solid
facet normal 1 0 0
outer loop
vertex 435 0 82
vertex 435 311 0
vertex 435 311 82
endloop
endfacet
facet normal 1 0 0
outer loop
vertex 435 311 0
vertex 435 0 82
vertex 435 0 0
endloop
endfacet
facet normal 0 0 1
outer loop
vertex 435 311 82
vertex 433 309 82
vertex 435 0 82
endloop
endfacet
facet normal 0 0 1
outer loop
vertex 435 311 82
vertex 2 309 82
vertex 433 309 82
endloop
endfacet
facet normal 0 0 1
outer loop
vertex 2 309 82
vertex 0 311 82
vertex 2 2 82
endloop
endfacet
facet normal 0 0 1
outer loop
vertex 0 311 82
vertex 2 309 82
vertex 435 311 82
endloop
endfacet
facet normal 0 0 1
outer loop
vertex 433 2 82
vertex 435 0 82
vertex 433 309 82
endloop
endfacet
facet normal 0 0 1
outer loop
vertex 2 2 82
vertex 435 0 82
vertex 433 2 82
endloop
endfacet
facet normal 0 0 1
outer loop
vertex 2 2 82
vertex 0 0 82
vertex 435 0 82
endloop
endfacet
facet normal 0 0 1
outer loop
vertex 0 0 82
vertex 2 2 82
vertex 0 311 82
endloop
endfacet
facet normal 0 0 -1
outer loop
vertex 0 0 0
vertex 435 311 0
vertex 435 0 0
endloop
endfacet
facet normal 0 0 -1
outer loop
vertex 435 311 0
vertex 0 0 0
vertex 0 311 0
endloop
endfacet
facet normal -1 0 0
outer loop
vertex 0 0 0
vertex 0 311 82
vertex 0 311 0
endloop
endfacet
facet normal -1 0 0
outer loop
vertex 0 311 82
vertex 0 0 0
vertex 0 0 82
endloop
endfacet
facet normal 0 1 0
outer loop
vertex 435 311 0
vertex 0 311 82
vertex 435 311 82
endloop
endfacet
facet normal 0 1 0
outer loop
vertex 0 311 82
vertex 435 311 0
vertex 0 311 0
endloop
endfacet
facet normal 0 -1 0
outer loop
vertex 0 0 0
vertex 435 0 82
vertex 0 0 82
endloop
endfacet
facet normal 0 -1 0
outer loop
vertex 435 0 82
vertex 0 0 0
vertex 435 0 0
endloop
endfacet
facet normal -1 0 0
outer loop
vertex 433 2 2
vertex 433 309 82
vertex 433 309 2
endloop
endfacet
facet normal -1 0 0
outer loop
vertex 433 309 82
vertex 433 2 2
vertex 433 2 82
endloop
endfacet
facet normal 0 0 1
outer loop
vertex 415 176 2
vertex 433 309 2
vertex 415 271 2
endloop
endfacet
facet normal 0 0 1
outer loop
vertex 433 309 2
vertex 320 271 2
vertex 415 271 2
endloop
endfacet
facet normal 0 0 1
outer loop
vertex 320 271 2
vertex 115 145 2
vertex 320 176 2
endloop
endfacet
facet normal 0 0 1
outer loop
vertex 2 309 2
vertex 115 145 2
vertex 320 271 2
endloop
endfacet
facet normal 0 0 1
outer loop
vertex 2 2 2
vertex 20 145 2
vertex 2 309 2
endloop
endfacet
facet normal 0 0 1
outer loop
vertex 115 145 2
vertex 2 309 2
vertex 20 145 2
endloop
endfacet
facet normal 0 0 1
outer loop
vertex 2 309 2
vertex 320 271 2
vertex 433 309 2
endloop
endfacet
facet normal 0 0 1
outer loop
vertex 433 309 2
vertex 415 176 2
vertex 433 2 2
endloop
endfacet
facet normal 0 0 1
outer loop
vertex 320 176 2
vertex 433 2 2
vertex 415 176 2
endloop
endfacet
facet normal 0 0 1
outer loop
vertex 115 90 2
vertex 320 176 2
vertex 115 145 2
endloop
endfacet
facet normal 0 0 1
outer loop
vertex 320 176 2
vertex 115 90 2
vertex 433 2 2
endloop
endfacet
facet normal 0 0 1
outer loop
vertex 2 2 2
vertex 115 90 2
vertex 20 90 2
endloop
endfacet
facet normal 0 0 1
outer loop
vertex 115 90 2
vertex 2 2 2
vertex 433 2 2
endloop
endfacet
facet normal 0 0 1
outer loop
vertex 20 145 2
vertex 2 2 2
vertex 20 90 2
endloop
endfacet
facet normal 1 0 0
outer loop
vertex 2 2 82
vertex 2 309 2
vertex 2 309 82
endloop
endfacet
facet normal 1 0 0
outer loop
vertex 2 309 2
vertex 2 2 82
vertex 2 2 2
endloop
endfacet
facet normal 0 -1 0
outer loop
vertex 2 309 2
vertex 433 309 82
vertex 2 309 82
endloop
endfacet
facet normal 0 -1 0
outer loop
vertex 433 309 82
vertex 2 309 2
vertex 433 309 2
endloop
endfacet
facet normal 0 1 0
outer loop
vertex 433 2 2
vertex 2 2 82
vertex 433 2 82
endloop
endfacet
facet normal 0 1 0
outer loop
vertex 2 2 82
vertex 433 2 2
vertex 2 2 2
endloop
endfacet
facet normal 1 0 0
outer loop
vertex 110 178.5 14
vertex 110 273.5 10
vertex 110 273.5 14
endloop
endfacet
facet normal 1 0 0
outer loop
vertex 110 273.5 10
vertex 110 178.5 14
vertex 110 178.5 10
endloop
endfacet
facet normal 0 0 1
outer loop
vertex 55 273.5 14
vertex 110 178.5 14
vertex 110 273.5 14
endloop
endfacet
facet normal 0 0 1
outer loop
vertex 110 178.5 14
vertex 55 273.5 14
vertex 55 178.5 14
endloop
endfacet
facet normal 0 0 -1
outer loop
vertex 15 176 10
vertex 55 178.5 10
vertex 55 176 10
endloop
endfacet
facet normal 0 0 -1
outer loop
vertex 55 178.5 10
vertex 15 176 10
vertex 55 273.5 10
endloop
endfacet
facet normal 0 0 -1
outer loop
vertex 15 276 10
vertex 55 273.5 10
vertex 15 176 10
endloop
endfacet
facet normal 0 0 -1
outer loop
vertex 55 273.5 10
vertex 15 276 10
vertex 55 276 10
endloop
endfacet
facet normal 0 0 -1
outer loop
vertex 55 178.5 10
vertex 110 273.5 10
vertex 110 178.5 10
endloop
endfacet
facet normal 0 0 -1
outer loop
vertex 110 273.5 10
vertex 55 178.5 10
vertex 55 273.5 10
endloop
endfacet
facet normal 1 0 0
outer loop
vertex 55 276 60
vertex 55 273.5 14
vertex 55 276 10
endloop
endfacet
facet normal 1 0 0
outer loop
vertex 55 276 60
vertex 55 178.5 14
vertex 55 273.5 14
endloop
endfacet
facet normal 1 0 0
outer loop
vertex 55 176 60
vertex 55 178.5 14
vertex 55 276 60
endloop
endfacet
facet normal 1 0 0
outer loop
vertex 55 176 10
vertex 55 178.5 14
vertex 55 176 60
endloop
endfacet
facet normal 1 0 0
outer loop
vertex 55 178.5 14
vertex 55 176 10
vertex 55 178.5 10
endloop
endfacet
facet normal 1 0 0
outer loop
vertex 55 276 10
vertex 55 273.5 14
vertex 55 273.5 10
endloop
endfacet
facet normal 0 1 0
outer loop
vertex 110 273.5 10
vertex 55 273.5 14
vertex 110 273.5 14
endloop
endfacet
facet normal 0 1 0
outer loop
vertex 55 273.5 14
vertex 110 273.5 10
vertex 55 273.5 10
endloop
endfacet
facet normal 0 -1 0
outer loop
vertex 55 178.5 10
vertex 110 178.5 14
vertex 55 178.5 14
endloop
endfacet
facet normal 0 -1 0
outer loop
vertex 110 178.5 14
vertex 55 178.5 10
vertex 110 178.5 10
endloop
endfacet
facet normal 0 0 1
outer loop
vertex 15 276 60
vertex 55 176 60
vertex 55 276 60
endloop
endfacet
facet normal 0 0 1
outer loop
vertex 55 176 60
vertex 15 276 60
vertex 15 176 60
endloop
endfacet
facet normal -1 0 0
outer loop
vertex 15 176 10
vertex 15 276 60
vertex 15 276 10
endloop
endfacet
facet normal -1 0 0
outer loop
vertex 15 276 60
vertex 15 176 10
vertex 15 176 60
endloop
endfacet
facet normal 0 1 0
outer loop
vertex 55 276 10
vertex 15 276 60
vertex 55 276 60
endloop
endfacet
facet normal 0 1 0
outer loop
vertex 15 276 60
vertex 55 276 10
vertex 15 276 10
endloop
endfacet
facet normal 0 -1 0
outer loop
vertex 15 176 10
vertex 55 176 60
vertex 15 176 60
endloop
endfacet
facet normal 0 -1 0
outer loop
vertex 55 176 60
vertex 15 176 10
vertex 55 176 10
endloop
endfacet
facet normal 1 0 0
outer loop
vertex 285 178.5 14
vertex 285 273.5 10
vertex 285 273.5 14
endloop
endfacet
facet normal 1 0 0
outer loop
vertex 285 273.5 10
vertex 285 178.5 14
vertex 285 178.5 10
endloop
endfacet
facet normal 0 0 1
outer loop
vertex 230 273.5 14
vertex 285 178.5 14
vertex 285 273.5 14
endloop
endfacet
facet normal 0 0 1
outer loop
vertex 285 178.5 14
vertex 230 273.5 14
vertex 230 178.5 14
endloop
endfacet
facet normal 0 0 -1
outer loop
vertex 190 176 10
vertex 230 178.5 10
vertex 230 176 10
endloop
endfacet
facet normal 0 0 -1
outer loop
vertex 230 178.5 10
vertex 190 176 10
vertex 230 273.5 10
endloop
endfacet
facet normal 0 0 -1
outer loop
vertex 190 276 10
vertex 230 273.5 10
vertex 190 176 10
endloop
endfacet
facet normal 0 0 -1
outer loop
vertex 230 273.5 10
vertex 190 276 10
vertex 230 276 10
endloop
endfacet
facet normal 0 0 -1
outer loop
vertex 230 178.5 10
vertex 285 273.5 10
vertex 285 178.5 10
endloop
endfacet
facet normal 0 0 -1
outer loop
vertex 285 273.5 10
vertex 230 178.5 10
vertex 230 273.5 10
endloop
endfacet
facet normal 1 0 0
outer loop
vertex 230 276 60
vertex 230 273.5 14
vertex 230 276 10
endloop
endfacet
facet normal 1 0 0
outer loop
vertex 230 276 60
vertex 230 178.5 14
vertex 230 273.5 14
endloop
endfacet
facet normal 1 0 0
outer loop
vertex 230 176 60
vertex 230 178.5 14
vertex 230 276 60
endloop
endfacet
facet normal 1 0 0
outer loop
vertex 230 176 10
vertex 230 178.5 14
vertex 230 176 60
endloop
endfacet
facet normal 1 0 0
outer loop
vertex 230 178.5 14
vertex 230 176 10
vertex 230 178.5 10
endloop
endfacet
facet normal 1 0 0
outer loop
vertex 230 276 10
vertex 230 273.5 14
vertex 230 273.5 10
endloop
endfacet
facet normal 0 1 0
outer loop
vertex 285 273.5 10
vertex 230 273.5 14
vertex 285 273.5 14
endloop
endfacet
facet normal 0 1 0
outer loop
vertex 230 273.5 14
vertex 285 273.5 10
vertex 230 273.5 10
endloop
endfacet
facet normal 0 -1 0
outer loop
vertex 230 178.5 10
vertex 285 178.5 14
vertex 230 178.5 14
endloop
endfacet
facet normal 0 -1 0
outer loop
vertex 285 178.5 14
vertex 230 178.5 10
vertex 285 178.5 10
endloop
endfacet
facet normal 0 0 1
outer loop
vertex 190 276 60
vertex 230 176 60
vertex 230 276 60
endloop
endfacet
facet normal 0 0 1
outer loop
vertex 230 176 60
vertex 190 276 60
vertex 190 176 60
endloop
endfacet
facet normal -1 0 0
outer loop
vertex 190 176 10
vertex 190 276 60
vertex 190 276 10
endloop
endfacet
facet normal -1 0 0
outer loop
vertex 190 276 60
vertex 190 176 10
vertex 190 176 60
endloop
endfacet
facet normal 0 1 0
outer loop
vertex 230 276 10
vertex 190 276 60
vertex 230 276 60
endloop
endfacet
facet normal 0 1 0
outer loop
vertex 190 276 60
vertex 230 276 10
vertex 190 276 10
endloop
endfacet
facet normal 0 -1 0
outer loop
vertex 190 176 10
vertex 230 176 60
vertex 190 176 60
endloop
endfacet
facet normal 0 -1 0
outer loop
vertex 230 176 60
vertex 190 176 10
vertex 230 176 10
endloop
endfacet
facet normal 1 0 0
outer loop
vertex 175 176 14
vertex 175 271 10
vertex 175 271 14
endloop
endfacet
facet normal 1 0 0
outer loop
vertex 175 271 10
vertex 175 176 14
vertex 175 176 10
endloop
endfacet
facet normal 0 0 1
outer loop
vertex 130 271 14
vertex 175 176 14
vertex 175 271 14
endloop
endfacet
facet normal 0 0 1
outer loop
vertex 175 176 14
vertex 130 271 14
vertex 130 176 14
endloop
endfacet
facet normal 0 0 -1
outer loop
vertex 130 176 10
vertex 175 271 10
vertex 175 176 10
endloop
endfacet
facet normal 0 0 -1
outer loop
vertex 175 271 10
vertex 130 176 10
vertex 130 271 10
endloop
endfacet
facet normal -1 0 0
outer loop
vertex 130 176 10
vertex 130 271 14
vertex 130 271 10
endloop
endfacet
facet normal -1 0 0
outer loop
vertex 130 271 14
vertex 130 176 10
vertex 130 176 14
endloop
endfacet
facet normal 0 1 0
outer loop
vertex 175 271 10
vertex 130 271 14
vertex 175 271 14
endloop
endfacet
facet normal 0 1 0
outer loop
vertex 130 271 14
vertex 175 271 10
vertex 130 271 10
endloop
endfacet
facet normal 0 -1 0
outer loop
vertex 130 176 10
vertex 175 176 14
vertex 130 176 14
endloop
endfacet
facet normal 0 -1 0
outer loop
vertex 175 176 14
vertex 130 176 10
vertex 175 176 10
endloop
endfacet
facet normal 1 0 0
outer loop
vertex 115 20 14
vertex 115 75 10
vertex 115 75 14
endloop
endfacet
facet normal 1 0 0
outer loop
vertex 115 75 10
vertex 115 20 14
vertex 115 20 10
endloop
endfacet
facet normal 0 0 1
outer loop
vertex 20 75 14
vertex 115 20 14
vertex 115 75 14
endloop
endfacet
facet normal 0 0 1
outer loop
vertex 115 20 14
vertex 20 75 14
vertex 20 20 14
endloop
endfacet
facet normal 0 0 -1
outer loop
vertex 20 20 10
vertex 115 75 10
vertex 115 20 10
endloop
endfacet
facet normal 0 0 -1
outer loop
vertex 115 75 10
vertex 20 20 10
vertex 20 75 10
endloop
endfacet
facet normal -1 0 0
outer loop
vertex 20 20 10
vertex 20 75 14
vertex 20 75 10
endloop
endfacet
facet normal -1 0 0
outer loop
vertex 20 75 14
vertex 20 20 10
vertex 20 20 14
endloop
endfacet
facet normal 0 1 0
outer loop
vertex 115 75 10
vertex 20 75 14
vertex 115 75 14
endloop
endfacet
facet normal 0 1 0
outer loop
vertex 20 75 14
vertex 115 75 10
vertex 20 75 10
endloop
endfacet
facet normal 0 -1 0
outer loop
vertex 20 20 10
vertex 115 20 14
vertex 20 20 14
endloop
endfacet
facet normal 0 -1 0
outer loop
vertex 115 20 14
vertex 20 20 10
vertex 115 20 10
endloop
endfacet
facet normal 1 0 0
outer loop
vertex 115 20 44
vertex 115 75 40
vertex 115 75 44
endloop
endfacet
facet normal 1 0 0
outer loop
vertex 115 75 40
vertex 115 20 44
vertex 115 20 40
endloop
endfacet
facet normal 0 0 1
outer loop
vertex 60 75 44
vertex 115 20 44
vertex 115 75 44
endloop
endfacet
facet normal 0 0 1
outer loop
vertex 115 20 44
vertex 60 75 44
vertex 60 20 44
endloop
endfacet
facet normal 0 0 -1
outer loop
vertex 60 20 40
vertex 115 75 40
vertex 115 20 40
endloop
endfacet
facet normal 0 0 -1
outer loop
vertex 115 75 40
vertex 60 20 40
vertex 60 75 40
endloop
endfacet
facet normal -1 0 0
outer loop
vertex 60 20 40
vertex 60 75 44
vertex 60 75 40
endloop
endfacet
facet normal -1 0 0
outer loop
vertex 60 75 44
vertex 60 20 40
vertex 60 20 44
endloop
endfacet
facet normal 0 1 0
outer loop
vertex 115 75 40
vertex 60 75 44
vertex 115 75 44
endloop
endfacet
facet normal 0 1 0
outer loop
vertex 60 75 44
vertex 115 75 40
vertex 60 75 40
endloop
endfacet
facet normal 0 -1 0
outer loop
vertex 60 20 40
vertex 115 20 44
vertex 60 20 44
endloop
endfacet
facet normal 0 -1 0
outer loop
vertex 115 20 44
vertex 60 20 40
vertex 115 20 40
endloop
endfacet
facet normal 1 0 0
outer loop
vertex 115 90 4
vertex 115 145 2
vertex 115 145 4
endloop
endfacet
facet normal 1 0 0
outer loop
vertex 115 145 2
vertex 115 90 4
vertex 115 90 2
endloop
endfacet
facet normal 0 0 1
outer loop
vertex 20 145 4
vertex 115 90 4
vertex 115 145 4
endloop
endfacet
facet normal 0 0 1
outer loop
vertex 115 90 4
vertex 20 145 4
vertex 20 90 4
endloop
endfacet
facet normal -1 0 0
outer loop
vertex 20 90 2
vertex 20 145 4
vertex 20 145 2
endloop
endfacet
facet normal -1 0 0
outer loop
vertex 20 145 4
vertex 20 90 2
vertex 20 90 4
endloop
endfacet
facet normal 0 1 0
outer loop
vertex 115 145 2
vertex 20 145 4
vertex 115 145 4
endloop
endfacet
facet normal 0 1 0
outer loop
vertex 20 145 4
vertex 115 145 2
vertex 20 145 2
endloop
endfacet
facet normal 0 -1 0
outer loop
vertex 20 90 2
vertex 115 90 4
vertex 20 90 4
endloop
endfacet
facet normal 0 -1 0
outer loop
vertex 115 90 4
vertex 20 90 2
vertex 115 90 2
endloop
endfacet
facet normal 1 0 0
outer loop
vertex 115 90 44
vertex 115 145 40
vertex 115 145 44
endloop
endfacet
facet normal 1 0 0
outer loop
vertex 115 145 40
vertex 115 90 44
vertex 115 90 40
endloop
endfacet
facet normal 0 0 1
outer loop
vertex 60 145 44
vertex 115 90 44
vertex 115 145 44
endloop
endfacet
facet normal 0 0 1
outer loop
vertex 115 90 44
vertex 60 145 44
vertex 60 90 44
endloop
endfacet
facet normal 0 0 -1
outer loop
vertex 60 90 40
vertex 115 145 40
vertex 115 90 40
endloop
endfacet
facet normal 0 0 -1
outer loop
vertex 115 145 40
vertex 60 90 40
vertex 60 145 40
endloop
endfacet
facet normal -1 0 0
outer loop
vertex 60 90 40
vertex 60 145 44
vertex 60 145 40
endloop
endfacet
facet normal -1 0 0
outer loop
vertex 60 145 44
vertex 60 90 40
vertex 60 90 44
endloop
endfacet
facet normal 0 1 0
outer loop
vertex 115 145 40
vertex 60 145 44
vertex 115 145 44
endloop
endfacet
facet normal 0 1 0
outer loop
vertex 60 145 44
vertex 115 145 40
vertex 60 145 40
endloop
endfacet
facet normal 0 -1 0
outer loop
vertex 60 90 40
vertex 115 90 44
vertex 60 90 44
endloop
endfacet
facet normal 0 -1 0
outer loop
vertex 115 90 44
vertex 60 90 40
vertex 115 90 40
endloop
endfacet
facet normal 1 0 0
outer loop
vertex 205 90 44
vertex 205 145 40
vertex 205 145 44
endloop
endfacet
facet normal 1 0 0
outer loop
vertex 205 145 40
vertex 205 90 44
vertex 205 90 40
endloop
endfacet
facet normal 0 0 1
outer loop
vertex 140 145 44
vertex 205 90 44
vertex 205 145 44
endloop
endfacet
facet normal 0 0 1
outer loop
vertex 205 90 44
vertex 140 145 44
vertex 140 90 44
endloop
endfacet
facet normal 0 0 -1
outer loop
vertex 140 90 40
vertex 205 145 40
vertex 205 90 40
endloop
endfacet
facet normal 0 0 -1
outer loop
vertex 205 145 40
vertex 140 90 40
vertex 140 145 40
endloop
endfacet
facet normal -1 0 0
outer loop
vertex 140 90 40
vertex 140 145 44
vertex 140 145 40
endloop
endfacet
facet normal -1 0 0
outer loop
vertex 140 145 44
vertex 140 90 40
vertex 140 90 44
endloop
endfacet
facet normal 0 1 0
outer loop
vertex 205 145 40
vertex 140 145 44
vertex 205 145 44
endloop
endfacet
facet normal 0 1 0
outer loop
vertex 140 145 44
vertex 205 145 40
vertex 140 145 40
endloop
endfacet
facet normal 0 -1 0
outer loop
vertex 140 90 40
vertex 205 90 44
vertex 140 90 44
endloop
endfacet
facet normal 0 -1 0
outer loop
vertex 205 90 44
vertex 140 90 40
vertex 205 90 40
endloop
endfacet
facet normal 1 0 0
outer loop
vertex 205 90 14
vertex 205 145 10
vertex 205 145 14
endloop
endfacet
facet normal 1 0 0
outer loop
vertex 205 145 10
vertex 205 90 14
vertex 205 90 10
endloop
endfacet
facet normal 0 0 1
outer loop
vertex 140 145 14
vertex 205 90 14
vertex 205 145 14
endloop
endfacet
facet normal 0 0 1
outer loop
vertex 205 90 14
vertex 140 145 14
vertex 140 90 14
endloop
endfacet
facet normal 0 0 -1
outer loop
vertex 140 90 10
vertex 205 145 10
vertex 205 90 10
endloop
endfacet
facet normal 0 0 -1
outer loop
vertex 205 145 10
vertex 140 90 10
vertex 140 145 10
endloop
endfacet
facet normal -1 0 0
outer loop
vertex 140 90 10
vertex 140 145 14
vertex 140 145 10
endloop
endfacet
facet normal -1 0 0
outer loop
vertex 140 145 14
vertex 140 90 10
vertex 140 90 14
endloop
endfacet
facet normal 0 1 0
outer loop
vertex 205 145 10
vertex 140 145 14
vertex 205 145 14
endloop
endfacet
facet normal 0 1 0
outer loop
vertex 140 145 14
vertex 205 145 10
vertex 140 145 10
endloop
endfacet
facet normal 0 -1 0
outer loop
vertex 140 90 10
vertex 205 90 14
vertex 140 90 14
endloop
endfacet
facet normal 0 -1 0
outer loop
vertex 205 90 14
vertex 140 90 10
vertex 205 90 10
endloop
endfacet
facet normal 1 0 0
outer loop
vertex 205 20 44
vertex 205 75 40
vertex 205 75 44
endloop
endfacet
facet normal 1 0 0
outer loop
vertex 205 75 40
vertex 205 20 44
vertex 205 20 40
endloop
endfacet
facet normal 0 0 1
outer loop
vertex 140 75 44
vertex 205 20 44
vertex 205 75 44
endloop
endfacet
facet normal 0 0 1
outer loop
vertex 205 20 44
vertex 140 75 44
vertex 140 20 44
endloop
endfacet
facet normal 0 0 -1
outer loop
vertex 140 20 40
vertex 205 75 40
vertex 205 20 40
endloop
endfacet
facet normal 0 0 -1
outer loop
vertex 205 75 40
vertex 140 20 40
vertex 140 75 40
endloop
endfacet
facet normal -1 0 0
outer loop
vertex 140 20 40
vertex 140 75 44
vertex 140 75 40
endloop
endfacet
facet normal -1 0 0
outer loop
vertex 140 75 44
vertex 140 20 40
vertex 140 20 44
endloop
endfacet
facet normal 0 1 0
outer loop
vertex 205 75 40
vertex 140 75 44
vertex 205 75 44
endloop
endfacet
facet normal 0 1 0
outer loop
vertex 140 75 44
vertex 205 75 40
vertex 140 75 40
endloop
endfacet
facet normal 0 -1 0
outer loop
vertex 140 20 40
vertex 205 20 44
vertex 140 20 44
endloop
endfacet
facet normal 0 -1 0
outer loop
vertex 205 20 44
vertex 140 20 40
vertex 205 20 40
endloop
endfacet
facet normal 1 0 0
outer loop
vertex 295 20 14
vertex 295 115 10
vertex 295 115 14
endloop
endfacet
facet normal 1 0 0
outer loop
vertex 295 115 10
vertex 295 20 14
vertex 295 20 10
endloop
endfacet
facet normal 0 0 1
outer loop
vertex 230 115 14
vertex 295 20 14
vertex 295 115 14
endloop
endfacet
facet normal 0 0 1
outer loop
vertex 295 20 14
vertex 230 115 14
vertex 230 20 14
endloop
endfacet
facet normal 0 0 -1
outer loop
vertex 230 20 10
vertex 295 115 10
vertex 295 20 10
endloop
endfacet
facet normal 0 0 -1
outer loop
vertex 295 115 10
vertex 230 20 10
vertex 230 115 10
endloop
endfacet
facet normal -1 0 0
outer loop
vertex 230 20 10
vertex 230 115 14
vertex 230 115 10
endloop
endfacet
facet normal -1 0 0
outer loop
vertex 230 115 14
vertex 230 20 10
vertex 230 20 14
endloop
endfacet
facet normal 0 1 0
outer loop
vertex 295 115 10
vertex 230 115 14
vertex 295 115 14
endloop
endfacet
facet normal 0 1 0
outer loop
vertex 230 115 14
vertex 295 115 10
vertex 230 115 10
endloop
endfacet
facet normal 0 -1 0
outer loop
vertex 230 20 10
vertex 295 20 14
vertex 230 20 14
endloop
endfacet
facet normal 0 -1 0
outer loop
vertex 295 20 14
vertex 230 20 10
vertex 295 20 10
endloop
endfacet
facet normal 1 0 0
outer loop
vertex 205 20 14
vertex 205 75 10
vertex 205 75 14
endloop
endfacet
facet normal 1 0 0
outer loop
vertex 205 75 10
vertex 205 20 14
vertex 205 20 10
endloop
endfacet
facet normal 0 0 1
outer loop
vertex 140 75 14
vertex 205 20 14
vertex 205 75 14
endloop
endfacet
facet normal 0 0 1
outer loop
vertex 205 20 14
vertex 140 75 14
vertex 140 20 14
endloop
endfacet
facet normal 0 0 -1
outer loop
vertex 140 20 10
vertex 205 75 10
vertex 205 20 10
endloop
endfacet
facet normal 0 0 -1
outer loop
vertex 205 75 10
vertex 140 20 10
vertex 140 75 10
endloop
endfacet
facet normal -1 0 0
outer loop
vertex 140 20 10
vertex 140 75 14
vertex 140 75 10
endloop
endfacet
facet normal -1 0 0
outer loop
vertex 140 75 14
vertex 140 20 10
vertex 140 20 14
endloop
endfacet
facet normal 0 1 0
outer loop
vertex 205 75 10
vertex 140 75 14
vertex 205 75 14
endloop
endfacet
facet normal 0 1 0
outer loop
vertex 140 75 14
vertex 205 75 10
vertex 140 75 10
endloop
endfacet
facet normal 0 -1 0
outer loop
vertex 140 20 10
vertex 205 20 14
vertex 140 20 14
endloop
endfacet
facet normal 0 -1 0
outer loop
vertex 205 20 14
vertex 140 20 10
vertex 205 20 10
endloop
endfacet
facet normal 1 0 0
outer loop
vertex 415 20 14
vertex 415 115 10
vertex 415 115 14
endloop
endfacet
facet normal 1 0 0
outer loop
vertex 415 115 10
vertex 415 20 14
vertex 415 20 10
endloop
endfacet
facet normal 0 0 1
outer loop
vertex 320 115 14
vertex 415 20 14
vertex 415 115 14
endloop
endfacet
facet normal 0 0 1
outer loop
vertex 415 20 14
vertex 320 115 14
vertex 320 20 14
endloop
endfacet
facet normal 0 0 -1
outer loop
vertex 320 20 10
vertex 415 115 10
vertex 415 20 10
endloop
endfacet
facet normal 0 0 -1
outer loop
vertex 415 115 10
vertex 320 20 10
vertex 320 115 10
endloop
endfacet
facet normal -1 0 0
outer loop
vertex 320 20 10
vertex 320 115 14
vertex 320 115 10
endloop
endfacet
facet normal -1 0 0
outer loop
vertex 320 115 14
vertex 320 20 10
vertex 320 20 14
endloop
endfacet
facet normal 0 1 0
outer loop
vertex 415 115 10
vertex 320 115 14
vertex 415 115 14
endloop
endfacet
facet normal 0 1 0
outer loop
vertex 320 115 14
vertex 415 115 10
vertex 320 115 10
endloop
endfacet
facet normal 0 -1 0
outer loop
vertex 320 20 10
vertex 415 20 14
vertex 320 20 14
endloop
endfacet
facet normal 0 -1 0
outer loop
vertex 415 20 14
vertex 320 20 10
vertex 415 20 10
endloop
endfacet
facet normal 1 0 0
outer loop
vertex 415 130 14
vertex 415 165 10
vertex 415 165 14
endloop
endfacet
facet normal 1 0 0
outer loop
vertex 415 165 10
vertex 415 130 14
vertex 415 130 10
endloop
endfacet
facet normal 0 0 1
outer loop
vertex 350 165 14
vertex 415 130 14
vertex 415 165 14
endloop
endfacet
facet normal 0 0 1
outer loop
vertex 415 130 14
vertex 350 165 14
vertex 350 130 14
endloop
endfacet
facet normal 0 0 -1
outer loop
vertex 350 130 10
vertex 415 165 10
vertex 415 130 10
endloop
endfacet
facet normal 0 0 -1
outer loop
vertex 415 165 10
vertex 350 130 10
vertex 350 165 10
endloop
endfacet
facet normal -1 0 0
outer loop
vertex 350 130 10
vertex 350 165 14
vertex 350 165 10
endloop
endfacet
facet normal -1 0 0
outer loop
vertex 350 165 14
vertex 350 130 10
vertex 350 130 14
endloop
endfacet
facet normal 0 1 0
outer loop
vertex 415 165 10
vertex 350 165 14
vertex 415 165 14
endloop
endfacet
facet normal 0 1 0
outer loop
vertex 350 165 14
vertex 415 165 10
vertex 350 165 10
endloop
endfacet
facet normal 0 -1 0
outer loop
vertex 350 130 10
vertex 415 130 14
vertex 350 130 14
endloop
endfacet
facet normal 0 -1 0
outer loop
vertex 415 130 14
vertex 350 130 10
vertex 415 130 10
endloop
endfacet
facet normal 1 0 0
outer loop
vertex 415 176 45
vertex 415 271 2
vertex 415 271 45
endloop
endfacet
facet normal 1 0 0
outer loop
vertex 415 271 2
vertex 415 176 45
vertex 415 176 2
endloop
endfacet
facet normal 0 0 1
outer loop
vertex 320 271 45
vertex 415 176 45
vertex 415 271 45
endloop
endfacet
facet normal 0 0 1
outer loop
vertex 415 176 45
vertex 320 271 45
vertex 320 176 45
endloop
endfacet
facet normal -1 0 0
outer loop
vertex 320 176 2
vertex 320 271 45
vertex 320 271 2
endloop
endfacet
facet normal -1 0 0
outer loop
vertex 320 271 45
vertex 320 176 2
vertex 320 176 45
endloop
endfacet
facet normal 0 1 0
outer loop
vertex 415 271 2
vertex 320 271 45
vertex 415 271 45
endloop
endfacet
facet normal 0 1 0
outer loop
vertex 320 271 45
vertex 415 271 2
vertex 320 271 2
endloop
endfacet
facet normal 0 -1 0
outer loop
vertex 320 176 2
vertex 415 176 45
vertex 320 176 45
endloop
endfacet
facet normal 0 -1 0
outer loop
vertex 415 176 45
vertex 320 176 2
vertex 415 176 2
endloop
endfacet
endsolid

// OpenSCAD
width = 435;
height = 82;
depth = 311;

margin_lr = 20;


$fn = 64;


difference() {
  cube( [ width, depth, height ] );
            
  translate( [ 2, 2, 2 ] ) {
    cube( [ width - 4, depth - 4, height + 10 ] );
  }
}


// new channel left (blue)
translate( [ 15, depth - margin_lr - 115, 10 ] ) {
  translate( [ 40, 2.5, 0 ] ) {
      cube( [ 55, 95, 4 ] );
  }
  color( "blue" )
  cube( [ 40, 100, 50 ] );   
}

// new channel right (blue)
translate( [ 190, depth - margin_lr - 115, 10 ] ) {
  translate( [ 40, 2.5, 0 ] ) {
      cube( [ 55, 95, 4 ] );
  }
  color( "blue" )
  cube( [ 40, 100, 50 ] );    
}

// adau
translate( [ 130, depth - margin_lr - 115, 10 ] ) {
    color( "pink" )
  cube( [ 45, 95, 4 ] );   
}

// microprocessor
translate( [ margin_lr, margin_lr, 10 ] ) {
  color( "brown" )
  cube( [ 95, 55, 4 ] );   
}

// GPIO extender (pink)
translate( [ margin_lr + 40, margin_lr, 40 ] ) {
  color( "pink" )
  cube( [ 55, 55, 4 ] );   
}

// SPDIF (cyan)
translate( [ margin_lr, margin_lr + 70, 0 ] ) {
    color( "cyan" )
  cube( [ 95, 55, 4 ] );   
}

// DAC (orange)
translate( [ margin_lr + 40, margin_lr + 70, 40 ] ) {
  color( "orange" )
  cube( [ 55, 55, 4 ] );   
}


// subwoofer (magenta)
translate( [ 140, 90, 40 ] ) {
  color( "black" )
  cube( [ 65, 55, 4 ] );   
}


// channel sel (Yellow)
translate( [ 140, margin_lr + 70, 10 ] ) {
  color( "yellow" )
  cube( [ 65, 55, 4 ] );   
}

// vinyl (RED)
translate( [ 140, margin_lr, 40 ] ) {
  color( "red" )
  cube( [ 65, 55, 4 ] );   
}

// digital/ananlog power suppy
translate( [ 230, margin_lr, 10 ] ) {
  color( "Lavender" )
  cube( [ 65, 95, 4 ] );   
}
    
// FTDI
translate( [ 140, margin_lr, 10 ] ) {
  color( "purple" )
  cube( [ 65, 55, 4 ] );   
}
    

// power suppy
translate( [ width - margin_lr - 95, margin_lr, 10 ] ) {
  cube( [ 95, 95, 4 ] );   
}

// ground lift (green)
translate( [ width - margin_lr - 65, 130, 10 ] ) {
  color( "green" )
  cube( [ 65, 35, 4 ] );   
}


// toroid
translate( [ width - margin_lr - 95, depth - 135, 0 ] ) {
  cube( [ 95, 95, 45] );   
}
       
